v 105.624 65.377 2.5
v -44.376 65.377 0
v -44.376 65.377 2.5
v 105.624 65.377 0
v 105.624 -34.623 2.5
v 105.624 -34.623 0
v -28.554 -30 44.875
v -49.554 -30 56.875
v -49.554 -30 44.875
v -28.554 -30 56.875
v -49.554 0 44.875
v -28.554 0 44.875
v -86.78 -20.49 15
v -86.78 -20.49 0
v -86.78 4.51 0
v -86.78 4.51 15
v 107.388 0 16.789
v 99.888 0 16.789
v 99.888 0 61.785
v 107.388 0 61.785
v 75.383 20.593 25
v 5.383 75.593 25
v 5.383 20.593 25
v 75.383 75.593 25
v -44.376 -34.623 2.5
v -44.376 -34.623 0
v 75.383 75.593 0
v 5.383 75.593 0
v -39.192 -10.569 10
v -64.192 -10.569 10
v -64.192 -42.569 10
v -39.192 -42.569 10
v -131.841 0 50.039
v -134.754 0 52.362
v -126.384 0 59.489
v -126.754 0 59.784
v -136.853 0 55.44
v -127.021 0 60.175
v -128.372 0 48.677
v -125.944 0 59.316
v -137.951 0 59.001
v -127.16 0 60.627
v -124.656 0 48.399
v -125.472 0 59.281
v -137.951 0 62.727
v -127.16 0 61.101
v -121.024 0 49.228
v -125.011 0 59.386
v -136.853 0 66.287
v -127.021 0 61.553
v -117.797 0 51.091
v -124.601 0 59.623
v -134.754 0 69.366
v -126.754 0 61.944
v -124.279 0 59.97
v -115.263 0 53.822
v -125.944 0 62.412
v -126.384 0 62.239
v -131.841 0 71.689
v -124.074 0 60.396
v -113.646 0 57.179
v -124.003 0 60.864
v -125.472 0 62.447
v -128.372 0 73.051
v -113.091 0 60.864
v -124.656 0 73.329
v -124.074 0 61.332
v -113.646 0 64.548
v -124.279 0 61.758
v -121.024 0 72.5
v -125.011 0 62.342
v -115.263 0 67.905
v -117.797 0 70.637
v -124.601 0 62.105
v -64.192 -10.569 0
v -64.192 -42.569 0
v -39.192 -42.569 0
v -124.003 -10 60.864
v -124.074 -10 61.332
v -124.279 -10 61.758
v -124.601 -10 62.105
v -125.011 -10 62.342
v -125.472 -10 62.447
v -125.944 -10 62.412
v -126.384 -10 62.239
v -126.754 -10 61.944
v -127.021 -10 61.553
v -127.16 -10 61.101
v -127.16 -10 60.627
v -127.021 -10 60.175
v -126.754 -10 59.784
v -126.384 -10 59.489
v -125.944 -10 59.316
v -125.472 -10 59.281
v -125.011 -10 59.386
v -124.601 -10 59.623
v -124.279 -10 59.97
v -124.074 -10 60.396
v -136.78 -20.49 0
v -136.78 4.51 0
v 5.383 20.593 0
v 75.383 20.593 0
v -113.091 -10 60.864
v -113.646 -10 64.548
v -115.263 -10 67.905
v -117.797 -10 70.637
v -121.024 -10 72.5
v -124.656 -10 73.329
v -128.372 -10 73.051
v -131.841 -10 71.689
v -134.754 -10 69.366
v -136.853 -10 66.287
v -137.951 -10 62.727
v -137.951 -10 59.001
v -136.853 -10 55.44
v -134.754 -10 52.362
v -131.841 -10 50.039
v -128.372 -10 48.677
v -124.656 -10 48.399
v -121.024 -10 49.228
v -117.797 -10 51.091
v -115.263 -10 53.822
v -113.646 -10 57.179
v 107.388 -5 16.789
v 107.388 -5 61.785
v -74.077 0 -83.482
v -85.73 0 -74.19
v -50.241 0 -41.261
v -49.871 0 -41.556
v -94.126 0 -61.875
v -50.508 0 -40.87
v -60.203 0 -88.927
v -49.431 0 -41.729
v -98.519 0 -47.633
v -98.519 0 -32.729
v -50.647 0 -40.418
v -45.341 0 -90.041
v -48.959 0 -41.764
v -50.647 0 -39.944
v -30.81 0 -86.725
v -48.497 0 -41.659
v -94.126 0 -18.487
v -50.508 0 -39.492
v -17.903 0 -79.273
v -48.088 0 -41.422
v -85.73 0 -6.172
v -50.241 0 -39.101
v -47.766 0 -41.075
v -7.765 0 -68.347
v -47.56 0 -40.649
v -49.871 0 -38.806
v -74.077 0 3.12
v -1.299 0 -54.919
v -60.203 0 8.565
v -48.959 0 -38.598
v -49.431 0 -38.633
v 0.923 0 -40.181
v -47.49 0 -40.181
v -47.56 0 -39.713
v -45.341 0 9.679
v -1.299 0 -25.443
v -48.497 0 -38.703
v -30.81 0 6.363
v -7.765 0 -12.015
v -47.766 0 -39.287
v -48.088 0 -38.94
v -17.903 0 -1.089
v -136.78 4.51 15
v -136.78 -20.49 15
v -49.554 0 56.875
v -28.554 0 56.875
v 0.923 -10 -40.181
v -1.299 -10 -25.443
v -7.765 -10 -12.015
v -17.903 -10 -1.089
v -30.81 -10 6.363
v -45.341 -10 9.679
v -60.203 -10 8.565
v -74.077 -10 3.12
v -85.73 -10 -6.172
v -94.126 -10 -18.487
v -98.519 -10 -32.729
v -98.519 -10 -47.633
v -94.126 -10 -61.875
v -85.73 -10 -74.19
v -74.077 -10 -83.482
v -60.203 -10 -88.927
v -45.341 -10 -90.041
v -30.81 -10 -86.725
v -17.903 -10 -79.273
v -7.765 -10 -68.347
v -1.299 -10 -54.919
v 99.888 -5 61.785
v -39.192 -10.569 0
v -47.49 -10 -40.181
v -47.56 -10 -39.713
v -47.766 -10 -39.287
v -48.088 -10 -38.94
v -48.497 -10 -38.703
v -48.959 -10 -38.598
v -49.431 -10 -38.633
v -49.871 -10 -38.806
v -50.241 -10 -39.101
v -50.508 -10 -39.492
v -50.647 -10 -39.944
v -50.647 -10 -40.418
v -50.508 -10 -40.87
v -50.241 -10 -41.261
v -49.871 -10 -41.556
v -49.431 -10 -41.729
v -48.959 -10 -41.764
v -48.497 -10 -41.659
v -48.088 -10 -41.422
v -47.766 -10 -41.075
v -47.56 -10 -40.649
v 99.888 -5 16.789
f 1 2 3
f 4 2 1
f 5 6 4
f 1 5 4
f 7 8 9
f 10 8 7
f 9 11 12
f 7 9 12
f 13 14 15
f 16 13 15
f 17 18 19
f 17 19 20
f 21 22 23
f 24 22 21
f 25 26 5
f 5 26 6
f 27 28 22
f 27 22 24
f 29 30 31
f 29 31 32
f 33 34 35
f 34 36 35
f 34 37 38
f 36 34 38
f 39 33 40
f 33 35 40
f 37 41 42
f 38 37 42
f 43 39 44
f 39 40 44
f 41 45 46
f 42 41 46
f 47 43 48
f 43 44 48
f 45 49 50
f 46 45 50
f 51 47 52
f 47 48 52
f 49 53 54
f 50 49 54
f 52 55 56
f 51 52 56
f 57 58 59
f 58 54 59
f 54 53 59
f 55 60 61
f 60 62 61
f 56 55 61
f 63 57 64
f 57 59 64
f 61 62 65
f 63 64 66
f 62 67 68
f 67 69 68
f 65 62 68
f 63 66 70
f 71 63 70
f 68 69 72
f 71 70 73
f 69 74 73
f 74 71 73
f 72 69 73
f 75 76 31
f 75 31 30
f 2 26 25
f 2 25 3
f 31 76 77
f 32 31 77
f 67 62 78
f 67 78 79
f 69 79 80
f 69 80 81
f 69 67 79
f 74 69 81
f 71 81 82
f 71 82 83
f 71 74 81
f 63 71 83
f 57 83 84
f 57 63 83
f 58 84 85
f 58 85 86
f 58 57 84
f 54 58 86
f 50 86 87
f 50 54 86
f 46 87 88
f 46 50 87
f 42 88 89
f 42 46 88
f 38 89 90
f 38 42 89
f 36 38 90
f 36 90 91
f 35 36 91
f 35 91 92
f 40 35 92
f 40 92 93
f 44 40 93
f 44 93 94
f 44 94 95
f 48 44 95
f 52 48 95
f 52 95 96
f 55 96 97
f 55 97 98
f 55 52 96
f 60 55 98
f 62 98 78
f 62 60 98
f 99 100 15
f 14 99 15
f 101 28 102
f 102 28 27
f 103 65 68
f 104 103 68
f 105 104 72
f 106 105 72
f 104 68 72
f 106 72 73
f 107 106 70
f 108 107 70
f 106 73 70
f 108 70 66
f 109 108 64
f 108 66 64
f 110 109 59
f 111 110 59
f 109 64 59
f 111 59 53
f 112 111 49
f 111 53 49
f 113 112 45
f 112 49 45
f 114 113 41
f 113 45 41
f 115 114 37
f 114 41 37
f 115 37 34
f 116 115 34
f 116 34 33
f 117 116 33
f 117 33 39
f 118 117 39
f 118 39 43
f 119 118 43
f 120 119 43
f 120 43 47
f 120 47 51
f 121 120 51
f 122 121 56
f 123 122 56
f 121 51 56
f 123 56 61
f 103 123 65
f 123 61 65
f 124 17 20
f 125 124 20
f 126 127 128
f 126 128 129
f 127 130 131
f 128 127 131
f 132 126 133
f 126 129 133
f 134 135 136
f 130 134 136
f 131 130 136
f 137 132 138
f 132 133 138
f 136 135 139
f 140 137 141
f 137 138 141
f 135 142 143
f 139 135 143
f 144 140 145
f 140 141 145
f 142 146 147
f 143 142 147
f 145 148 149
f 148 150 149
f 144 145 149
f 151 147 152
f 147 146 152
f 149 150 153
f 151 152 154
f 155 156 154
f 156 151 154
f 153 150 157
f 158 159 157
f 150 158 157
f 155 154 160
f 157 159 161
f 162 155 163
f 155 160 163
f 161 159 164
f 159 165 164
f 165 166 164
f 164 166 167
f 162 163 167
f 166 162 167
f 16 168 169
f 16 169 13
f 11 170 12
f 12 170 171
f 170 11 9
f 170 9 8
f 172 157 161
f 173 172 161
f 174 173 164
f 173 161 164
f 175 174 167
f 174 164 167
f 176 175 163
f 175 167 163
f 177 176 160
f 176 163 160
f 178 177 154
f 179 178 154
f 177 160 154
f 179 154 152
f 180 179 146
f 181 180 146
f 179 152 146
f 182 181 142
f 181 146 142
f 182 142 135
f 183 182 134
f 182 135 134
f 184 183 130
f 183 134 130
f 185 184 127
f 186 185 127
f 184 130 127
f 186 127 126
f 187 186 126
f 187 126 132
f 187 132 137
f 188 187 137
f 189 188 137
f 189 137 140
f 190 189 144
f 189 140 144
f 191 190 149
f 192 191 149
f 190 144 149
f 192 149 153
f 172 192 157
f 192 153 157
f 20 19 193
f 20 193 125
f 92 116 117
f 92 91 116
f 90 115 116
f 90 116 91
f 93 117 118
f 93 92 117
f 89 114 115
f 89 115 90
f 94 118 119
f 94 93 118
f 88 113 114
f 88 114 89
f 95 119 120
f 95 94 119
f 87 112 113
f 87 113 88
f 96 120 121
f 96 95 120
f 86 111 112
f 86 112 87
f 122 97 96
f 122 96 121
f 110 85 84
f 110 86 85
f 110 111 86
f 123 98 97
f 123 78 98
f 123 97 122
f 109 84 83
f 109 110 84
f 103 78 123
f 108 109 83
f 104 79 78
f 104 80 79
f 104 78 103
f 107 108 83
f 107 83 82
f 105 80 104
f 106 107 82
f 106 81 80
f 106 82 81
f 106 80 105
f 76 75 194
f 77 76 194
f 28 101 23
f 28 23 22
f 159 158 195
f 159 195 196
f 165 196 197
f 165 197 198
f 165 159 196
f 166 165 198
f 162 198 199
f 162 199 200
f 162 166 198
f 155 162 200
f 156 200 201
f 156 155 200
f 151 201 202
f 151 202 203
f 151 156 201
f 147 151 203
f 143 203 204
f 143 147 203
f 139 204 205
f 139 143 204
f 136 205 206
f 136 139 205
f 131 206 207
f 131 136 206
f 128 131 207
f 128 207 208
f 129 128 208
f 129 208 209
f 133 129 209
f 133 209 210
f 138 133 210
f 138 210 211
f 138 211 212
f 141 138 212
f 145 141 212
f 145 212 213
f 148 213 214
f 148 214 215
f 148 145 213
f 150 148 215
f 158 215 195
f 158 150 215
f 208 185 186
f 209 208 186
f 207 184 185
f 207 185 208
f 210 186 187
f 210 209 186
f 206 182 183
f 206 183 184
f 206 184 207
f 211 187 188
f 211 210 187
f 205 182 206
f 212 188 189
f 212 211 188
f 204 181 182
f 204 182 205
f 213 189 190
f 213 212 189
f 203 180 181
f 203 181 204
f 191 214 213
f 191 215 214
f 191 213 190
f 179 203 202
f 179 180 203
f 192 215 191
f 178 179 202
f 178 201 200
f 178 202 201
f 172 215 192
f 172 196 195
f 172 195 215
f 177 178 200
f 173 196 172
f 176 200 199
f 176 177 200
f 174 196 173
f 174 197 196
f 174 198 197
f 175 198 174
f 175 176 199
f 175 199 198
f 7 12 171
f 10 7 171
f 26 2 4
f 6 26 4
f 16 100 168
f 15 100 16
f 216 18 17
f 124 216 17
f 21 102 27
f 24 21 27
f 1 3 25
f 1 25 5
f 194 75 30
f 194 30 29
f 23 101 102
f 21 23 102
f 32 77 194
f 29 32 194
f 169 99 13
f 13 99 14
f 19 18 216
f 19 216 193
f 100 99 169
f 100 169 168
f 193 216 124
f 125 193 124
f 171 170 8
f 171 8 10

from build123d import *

# Parameters (mm, degrees)
F0_W      = 50
F0_H      = 25
F1_DEPTH  = 15
F2_W      = 70
F2_H      = 55
F3_DEPTH  = 25
F4_W      = 21
F4_H      = 12
F5_DEPTH  = 30
F6_W      = 25
F6_H      = 32
F7_DEPTH  = 10
F8_W      = 150
F8_H      = 100
F9_DEPTH  = 2.5
F10_R     = 50
F10_R_2   = 1.5875
F11_DEPTH = 10
F12_R     = 12.5
F12_R_2   = 1.5875
F13_DEPTH = 10
F14_W     = 7.5
F14_H     = 44.9961
F15_DEPTH = 5


# Not quite as in the source:
# - a feature names something its author has since deleted; it is built from what else it names


with BuildPart() as f1:
    # F0 (on Top) → F1 (new body)
    with BuildSketch(Plane.XY):
        with Locations((-111.7799058557, -7.9904274056)):
            Rectangle(F0_W, F0_H)
    extrude(amount=F1_DEPTH)


with BuildPart() as f3:
    # F2 (on Top) → F3 (new body)
    with BuildSketch(Plane.XY):
        with Locations((40.3834730387, 48.0927660437)):
            Rectangle(F2_W, F2_H)
    extrude(amount=F3_DEPTH)


with BuildPart() as f5:
    # F4 (on Front) → F5 (new body)
    with BuildSketch(Plane.XZ):
        with Locations((-39.0541495681, 50.8754973734)):
            Rectangle(F4_W, F4_H)
    extrude(amount=F5_DEPTH)


with BuildPart() as f7:
    # F6 (on Top) → F7 (new body)
    with BuildSketch(Plane.XY):
        with Locations((-51.6924057156, -26.56879695)):
            Rectangle(F6_W, F6_H)
    extrude(amount=F7_DEPTH)


with BuildPart() as f9:
    # F8 (on Top) → F9 (new body)
    with BuildSketch(Plane.XY):
        with Locations((30.6242685765, 15.3774665831)):
            Rectangle(F8_W, F8_H)
    extrude(amount=F9_DEPTH)


with BuildPart() as f11:
    # F10 (on Front) → F11 (new body)
    with BuildSketch(Plane.XZ):
        with Locations((-49.077399075, -40.1809364557)):
            Circle(F10_R)
        with Locations((-49.077399075, -40.1809364557)):
            Circle(F10_R_2, mode=Mode.SUBTRACT)
    extrude(amount=F11_DEPTH)


with BuildPart() as f13:
    # F12 (on Front) → F13 (new body)
    with BuildSketch(Plane.XZ):
        with Locations((-125.5905777216, 60.8639121056)):
            Circle(F12_R)
        with Locations((-125.5905777216, 60.8639121056)):
            Circle(F12_R_2, mode=Mode.SUBTRACT)
    extrude(amount=F13_DEPTH)


with BuildPart() as f15:
    # F14 (on Front) → F15 (new body)
    with BuildSketch(Plane.XZ):
        with Locations((103.637938503, 39.2873273231)):
            Rectangle(F14_W, F14_H)
    extrude(amount=F15_DEPTH)


solid = Compound([f1.part, f3.part, f5.part, f7.part, f9.part, f11.part, f13.part, f15.part])
